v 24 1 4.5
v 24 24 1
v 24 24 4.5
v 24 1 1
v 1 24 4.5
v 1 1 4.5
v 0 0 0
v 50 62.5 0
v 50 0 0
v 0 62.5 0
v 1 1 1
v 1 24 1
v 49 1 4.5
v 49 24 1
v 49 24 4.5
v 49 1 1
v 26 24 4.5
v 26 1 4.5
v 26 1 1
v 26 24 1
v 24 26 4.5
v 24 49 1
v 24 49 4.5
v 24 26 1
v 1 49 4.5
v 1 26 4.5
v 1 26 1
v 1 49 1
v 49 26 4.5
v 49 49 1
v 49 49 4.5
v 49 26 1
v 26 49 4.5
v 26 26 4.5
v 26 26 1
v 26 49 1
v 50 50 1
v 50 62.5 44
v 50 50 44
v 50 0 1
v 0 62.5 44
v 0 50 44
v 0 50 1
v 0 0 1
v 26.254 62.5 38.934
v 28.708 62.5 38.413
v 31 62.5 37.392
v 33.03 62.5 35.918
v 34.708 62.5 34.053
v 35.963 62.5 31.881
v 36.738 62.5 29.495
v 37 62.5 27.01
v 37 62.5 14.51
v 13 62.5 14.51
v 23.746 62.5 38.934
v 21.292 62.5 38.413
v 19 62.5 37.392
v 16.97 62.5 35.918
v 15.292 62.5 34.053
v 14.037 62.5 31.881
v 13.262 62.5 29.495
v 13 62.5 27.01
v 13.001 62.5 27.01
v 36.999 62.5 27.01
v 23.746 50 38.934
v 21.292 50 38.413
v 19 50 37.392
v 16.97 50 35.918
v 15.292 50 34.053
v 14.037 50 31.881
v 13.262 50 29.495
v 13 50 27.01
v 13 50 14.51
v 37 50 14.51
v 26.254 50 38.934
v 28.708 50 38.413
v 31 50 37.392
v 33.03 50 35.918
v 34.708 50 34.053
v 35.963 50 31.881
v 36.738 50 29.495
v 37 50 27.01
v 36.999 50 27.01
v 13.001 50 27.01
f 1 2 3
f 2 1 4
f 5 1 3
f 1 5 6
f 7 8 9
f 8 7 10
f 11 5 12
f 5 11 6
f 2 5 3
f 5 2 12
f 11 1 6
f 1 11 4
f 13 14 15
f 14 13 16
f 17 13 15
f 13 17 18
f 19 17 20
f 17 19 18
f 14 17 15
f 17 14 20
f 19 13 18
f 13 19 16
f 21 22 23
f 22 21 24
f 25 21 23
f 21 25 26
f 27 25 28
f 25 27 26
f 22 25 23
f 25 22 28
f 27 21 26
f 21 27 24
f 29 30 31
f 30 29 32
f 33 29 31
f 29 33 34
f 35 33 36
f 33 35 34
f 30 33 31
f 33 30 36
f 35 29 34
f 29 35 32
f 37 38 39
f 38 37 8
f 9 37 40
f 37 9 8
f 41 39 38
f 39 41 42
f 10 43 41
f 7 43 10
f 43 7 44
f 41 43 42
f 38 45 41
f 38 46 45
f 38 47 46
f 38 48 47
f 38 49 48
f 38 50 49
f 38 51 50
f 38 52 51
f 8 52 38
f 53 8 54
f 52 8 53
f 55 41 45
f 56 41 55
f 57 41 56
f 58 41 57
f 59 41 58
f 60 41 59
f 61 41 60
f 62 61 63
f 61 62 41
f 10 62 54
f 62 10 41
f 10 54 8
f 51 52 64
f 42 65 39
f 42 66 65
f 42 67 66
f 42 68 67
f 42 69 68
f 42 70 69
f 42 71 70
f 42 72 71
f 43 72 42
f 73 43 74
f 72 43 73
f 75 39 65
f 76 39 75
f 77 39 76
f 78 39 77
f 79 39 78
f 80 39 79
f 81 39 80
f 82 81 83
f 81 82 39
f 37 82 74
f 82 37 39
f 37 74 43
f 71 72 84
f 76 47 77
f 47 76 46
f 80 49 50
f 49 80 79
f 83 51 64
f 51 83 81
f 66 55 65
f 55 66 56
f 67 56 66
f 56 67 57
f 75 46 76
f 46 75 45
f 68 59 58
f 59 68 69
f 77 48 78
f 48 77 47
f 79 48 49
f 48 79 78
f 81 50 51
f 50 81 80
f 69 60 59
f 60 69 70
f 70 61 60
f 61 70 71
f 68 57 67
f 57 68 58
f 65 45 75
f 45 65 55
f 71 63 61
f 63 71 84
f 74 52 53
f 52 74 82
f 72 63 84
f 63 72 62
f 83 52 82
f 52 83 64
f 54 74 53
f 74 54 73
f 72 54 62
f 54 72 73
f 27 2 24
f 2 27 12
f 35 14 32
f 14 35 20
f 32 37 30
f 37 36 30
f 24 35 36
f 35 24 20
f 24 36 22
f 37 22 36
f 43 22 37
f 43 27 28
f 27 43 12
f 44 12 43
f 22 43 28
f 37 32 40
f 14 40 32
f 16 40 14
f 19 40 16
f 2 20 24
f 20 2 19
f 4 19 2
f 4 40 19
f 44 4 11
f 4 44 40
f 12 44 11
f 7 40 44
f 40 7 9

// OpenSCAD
color("LightGray") {
    translate([1,1,0]) cube([23,23,4.5]);
    translate([25+1,1,0]) cube([23,23,4.5]);
    translate([1,25+1,0]) cube([23,23,4.5]);
    translate([25+1,25+1,0]) cube([23,23,4.5]);
}
color("Grey") {
    cube([50,50,1]);
    difference() {
        translate([0,50,0]) cube([50,12.5,50-6]);
        translate([25,25,27]) rotate([-90,0,0]) cylinder(50,12,12);
        translate([13,25,4.51+10]) cube([24,50,27-4.5-10]);
    }
}
